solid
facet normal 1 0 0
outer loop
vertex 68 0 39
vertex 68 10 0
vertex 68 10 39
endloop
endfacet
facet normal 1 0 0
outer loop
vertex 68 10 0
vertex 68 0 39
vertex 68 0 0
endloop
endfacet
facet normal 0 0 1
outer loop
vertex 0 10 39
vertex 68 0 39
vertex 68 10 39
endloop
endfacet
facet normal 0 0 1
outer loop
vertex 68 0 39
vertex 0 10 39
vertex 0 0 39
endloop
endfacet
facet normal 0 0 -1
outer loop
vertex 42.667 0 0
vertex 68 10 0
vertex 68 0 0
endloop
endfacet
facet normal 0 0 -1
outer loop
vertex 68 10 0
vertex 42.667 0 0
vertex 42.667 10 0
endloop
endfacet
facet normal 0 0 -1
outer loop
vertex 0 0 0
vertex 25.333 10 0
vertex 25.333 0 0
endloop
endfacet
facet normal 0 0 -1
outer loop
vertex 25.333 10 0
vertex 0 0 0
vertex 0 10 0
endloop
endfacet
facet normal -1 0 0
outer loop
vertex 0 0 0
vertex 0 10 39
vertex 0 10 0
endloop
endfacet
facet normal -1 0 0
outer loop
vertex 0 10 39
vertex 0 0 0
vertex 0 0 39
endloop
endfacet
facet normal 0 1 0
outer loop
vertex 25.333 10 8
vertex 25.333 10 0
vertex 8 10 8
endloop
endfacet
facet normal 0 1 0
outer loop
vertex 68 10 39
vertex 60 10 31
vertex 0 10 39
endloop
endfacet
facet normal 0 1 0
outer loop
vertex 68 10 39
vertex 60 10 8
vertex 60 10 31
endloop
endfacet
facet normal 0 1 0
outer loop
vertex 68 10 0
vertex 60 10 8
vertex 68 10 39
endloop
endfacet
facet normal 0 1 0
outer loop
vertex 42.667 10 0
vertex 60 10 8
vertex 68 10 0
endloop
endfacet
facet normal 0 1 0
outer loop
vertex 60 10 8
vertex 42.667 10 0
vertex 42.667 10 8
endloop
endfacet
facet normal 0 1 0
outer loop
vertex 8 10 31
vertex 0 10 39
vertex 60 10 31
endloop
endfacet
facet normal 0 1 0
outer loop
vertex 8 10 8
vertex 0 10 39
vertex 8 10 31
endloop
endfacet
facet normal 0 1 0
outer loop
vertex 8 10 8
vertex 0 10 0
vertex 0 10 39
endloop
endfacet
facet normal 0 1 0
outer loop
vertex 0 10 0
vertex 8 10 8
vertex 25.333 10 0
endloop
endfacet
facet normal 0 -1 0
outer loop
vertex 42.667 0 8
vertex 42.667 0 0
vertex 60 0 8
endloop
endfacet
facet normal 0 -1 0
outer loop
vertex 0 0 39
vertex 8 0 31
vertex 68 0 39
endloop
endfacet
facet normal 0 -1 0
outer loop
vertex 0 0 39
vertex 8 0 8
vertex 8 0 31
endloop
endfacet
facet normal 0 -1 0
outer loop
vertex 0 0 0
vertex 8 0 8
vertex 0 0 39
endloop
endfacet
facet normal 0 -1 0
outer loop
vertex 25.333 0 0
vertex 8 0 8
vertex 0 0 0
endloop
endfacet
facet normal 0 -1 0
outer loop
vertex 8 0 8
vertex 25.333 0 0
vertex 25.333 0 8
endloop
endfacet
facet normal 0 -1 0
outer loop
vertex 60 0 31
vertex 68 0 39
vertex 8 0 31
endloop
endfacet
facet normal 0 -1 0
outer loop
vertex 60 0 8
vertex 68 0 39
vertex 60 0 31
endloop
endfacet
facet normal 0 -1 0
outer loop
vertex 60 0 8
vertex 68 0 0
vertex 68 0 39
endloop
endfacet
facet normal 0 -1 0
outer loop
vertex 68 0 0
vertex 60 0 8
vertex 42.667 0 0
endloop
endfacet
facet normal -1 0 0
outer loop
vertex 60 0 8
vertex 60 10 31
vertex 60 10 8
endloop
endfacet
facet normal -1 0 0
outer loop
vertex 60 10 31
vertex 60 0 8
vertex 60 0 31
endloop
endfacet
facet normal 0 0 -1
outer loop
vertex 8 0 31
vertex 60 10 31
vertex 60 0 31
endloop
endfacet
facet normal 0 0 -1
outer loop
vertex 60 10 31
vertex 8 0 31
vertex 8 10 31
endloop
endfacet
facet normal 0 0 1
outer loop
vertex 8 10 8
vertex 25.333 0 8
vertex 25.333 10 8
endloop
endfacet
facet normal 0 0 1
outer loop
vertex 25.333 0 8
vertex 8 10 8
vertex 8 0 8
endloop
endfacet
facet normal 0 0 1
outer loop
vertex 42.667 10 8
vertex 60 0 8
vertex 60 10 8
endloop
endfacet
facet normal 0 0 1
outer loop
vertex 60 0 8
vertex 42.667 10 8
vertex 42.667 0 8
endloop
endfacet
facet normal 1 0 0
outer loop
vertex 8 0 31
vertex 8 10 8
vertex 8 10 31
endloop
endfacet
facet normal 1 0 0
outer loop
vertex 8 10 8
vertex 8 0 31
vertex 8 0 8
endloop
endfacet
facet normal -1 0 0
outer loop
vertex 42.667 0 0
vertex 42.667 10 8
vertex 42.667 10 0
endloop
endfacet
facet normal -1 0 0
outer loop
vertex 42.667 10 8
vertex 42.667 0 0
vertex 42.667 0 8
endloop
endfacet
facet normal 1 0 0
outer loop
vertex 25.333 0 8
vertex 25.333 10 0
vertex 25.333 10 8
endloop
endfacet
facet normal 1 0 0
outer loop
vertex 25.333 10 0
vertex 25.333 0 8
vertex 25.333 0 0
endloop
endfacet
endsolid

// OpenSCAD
/* [Dimensions] */
// The width of the table leg this is going around
width = 52; //[40:100]
// The height of the table leg this is going around
height = 23; // [20:60]
// How thick you want the bumper to be
depth = 10; //[5:20]
// how much bigger to make the bumper than the leg
wallthickness = 8; //[5:22]

/* [Hidden] */
// used to make sure that cutouts do not exactly line up with the surface
// that they are removing. 
// To see the effect changing this to 1.01 should have no effect on the final product
small=0.01;

module ben() {
    cube([width, depth+2*small, height]);
}

//!ben();


module stopper() {
    cube([width + 2*wallthickness, depth, height + 2 * wallthickness]);
}
//!stopper();

difference() {
    stopper();
    translate([wallthickness, -small, wallthickness]) ben();
    translate([wallthickness+width/2-width/3/2, -small, -small]) cube([width/3, depth+2*small, wallthickness+2*small]);
}
